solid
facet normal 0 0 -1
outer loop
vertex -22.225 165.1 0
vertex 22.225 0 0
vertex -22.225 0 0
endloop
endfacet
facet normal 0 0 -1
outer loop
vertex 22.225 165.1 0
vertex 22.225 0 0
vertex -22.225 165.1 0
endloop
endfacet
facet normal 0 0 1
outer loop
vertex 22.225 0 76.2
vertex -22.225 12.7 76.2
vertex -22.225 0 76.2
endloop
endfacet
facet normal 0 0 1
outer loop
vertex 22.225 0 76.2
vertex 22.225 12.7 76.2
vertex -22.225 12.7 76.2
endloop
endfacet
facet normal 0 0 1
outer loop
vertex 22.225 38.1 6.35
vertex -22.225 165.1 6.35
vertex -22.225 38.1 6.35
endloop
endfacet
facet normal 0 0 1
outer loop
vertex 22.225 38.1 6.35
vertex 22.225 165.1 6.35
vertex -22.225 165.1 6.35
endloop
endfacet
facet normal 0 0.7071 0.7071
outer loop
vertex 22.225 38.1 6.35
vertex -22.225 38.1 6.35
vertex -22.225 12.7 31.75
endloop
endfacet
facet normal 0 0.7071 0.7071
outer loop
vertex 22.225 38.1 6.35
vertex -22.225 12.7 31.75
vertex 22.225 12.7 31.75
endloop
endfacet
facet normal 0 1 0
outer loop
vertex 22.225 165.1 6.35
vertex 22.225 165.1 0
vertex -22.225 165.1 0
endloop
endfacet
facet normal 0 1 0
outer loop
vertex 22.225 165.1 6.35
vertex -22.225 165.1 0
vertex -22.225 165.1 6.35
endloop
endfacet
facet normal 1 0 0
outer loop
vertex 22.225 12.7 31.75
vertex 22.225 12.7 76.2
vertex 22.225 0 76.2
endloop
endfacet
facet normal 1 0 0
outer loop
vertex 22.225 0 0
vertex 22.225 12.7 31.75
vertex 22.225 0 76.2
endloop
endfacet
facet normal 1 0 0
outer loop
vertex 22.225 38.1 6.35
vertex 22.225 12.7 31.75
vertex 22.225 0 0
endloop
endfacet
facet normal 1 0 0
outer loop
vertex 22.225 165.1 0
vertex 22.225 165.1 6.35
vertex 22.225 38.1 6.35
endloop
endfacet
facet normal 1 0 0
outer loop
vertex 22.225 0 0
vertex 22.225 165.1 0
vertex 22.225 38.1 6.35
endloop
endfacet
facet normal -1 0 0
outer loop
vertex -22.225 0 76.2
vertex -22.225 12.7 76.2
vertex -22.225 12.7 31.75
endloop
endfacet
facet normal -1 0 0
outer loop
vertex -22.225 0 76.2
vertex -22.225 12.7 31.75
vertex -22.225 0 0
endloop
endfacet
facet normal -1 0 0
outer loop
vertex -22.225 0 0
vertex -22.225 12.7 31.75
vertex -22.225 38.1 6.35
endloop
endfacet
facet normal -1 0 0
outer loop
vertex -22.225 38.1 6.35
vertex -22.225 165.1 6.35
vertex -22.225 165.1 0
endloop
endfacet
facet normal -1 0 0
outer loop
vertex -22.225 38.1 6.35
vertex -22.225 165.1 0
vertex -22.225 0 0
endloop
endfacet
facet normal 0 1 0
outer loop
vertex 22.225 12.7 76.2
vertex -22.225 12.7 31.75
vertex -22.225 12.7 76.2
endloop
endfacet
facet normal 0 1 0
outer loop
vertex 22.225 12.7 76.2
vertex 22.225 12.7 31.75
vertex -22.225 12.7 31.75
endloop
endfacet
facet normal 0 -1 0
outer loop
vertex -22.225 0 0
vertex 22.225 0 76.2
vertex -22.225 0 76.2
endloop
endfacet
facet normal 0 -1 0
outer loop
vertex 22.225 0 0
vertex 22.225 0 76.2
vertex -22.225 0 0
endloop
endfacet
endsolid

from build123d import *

# Parameters (mm, degrees)
BOSS_EXTRUDE1_DEPTH = 22.225
CHAMFER1_SIZE       = 25.4


with BuildPart() as part:
    # Sketch1 → Boss-Extrude1 (new, symmetric)
    with BuildSketch(Plane(origin=(0, 0, 0), x_dir=(0, 0, -1), z_dir=(1, 0, 0))):
        Polygon((0, 0), (0, 165.1), (-6.35, 165.1), (-6.35, 12.7), (-76.2, 12.7), (-76.2, 0), align=None)
    extrude(amount=BOSS_EXTRUDE1_DEPTH, both=True)

    # Chamfer1
    chamfer1_edges = [part.edges().sort_by_distance(p)[0] for p in [
        (0, 12.7, 6.35),
    ]]
    chamfer(chamfer1_edges, length=CHAMFER1_SIZE)


solid = part.part
